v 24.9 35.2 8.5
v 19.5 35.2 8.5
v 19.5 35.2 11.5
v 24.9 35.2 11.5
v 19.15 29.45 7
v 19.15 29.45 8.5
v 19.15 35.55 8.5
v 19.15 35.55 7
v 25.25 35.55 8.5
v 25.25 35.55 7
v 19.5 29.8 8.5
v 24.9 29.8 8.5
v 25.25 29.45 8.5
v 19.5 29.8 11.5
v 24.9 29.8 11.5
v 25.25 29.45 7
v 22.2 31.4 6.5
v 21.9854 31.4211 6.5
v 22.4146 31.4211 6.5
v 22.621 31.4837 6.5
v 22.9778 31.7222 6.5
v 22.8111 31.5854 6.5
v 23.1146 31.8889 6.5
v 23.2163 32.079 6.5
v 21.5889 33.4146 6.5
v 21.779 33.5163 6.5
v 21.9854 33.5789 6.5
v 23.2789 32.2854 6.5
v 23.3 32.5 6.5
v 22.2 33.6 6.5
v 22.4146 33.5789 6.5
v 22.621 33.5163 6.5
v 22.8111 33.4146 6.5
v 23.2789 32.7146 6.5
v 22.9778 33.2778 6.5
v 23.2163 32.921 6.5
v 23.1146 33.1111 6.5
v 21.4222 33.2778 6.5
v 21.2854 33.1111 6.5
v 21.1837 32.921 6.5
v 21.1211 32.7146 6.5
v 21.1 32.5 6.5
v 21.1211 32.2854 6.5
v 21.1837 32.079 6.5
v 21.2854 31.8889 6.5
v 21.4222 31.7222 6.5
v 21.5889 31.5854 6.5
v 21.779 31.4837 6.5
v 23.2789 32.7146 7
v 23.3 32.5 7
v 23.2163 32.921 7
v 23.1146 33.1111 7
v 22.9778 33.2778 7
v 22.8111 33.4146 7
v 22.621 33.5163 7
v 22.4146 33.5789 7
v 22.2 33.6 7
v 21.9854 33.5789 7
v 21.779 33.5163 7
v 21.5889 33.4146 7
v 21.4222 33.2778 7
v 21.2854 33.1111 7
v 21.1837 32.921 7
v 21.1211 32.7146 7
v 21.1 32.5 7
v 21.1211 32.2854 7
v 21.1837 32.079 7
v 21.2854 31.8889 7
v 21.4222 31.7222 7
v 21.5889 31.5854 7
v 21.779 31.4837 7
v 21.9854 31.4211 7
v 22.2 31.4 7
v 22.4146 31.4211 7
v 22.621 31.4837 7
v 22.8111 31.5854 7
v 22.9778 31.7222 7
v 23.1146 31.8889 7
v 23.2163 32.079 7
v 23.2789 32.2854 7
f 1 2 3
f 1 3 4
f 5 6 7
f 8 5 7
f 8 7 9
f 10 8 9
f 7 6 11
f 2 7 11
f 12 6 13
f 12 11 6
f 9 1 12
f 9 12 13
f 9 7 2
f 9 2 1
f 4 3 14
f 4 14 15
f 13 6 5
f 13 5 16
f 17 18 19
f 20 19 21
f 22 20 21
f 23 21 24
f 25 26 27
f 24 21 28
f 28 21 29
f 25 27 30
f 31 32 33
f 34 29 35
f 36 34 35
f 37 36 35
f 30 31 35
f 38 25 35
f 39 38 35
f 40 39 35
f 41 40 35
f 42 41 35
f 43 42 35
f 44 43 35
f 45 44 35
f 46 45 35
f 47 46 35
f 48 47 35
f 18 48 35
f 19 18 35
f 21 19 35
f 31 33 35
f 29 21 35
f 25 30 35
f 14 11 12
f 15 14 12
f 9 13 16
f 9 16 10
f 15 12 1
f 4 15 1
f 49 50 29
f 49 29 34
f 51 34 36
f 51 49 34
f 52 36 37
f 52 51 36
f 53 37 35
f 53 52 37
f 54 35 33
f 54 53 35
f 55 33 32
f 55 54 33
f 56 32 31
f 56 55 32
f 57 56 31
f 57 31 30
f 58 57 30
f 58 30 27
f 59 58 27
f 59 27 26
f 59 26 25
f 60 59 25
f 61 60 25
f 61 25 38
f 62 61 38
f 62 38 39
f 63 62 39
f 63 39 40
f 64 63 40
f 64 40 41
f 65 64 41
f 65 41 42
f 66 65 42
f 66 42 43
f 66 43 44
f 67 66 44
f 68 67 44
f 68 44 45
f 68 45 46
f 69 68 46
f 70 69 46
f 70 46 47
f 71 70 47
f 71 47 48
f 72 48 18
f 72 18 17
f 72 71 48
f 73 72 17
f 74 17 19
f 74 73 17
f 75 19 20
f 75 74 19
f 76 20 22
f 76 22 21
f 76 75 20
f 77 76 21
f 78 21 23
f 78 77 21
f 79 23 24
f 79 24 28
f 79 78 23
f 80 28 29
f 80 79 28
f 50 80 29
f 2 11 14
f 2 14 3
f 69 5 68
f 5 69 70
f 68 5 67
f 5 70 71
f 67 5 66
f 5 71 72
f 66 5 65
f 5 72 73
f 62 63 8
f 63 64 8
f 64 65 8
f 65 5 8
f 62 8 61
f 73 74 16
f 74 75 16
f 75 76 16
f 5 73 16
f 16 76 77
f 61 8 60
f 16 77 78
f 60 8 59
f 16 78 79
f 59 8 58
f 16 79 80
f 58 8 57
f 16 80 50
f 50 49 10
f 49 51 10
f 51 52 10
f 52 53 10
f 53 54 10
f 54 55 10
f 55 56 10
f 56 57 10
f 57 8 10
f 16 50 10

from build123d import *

# Parameters (mm, degrees)
SKETCH018_W  = 5.4
SKETCH018_H  = 5.4
PAD012_DEPTH = 3
SKETCH020_W  = 6.1
SKETCH020_H  = 6.1
PAD013_DEPTH = 1.5
SKETCH021_R  = 1.1
PAD014_DEPTH = 2


with BuildPart() as part:
    # Sketch018 → Pad012 (new body)
    with BuildSketch(Plane.XY):
        with Locations((22.2, 0)):
            Rectangle(SKETCH018_W, SKETCH018_H)
    extrude(amount=PAD012_DEPTH)

    # Sketch020 → Pad013 (join)
    with BuildSketch(Plane.XY):
        with Locations((22.2, 0)):
            Rectangle(SKETCH020_W, SKETCH020_H)
    extrude(amount=-PAD013_DEPTH)

    # Sketch021 → Pad014 (join)
    with BuildSketch(Plane.XY):
        with Locations((22.2, 0)):
            Circle(SKETCH021_R)
    extrude(amount=-PAD014_DEPTH)


with BuildPart() as part_1:
    # Body006 placement: moved
    add(part.part.moved(Location((0, 32.5, 8.5))))


solid = part_1.part
